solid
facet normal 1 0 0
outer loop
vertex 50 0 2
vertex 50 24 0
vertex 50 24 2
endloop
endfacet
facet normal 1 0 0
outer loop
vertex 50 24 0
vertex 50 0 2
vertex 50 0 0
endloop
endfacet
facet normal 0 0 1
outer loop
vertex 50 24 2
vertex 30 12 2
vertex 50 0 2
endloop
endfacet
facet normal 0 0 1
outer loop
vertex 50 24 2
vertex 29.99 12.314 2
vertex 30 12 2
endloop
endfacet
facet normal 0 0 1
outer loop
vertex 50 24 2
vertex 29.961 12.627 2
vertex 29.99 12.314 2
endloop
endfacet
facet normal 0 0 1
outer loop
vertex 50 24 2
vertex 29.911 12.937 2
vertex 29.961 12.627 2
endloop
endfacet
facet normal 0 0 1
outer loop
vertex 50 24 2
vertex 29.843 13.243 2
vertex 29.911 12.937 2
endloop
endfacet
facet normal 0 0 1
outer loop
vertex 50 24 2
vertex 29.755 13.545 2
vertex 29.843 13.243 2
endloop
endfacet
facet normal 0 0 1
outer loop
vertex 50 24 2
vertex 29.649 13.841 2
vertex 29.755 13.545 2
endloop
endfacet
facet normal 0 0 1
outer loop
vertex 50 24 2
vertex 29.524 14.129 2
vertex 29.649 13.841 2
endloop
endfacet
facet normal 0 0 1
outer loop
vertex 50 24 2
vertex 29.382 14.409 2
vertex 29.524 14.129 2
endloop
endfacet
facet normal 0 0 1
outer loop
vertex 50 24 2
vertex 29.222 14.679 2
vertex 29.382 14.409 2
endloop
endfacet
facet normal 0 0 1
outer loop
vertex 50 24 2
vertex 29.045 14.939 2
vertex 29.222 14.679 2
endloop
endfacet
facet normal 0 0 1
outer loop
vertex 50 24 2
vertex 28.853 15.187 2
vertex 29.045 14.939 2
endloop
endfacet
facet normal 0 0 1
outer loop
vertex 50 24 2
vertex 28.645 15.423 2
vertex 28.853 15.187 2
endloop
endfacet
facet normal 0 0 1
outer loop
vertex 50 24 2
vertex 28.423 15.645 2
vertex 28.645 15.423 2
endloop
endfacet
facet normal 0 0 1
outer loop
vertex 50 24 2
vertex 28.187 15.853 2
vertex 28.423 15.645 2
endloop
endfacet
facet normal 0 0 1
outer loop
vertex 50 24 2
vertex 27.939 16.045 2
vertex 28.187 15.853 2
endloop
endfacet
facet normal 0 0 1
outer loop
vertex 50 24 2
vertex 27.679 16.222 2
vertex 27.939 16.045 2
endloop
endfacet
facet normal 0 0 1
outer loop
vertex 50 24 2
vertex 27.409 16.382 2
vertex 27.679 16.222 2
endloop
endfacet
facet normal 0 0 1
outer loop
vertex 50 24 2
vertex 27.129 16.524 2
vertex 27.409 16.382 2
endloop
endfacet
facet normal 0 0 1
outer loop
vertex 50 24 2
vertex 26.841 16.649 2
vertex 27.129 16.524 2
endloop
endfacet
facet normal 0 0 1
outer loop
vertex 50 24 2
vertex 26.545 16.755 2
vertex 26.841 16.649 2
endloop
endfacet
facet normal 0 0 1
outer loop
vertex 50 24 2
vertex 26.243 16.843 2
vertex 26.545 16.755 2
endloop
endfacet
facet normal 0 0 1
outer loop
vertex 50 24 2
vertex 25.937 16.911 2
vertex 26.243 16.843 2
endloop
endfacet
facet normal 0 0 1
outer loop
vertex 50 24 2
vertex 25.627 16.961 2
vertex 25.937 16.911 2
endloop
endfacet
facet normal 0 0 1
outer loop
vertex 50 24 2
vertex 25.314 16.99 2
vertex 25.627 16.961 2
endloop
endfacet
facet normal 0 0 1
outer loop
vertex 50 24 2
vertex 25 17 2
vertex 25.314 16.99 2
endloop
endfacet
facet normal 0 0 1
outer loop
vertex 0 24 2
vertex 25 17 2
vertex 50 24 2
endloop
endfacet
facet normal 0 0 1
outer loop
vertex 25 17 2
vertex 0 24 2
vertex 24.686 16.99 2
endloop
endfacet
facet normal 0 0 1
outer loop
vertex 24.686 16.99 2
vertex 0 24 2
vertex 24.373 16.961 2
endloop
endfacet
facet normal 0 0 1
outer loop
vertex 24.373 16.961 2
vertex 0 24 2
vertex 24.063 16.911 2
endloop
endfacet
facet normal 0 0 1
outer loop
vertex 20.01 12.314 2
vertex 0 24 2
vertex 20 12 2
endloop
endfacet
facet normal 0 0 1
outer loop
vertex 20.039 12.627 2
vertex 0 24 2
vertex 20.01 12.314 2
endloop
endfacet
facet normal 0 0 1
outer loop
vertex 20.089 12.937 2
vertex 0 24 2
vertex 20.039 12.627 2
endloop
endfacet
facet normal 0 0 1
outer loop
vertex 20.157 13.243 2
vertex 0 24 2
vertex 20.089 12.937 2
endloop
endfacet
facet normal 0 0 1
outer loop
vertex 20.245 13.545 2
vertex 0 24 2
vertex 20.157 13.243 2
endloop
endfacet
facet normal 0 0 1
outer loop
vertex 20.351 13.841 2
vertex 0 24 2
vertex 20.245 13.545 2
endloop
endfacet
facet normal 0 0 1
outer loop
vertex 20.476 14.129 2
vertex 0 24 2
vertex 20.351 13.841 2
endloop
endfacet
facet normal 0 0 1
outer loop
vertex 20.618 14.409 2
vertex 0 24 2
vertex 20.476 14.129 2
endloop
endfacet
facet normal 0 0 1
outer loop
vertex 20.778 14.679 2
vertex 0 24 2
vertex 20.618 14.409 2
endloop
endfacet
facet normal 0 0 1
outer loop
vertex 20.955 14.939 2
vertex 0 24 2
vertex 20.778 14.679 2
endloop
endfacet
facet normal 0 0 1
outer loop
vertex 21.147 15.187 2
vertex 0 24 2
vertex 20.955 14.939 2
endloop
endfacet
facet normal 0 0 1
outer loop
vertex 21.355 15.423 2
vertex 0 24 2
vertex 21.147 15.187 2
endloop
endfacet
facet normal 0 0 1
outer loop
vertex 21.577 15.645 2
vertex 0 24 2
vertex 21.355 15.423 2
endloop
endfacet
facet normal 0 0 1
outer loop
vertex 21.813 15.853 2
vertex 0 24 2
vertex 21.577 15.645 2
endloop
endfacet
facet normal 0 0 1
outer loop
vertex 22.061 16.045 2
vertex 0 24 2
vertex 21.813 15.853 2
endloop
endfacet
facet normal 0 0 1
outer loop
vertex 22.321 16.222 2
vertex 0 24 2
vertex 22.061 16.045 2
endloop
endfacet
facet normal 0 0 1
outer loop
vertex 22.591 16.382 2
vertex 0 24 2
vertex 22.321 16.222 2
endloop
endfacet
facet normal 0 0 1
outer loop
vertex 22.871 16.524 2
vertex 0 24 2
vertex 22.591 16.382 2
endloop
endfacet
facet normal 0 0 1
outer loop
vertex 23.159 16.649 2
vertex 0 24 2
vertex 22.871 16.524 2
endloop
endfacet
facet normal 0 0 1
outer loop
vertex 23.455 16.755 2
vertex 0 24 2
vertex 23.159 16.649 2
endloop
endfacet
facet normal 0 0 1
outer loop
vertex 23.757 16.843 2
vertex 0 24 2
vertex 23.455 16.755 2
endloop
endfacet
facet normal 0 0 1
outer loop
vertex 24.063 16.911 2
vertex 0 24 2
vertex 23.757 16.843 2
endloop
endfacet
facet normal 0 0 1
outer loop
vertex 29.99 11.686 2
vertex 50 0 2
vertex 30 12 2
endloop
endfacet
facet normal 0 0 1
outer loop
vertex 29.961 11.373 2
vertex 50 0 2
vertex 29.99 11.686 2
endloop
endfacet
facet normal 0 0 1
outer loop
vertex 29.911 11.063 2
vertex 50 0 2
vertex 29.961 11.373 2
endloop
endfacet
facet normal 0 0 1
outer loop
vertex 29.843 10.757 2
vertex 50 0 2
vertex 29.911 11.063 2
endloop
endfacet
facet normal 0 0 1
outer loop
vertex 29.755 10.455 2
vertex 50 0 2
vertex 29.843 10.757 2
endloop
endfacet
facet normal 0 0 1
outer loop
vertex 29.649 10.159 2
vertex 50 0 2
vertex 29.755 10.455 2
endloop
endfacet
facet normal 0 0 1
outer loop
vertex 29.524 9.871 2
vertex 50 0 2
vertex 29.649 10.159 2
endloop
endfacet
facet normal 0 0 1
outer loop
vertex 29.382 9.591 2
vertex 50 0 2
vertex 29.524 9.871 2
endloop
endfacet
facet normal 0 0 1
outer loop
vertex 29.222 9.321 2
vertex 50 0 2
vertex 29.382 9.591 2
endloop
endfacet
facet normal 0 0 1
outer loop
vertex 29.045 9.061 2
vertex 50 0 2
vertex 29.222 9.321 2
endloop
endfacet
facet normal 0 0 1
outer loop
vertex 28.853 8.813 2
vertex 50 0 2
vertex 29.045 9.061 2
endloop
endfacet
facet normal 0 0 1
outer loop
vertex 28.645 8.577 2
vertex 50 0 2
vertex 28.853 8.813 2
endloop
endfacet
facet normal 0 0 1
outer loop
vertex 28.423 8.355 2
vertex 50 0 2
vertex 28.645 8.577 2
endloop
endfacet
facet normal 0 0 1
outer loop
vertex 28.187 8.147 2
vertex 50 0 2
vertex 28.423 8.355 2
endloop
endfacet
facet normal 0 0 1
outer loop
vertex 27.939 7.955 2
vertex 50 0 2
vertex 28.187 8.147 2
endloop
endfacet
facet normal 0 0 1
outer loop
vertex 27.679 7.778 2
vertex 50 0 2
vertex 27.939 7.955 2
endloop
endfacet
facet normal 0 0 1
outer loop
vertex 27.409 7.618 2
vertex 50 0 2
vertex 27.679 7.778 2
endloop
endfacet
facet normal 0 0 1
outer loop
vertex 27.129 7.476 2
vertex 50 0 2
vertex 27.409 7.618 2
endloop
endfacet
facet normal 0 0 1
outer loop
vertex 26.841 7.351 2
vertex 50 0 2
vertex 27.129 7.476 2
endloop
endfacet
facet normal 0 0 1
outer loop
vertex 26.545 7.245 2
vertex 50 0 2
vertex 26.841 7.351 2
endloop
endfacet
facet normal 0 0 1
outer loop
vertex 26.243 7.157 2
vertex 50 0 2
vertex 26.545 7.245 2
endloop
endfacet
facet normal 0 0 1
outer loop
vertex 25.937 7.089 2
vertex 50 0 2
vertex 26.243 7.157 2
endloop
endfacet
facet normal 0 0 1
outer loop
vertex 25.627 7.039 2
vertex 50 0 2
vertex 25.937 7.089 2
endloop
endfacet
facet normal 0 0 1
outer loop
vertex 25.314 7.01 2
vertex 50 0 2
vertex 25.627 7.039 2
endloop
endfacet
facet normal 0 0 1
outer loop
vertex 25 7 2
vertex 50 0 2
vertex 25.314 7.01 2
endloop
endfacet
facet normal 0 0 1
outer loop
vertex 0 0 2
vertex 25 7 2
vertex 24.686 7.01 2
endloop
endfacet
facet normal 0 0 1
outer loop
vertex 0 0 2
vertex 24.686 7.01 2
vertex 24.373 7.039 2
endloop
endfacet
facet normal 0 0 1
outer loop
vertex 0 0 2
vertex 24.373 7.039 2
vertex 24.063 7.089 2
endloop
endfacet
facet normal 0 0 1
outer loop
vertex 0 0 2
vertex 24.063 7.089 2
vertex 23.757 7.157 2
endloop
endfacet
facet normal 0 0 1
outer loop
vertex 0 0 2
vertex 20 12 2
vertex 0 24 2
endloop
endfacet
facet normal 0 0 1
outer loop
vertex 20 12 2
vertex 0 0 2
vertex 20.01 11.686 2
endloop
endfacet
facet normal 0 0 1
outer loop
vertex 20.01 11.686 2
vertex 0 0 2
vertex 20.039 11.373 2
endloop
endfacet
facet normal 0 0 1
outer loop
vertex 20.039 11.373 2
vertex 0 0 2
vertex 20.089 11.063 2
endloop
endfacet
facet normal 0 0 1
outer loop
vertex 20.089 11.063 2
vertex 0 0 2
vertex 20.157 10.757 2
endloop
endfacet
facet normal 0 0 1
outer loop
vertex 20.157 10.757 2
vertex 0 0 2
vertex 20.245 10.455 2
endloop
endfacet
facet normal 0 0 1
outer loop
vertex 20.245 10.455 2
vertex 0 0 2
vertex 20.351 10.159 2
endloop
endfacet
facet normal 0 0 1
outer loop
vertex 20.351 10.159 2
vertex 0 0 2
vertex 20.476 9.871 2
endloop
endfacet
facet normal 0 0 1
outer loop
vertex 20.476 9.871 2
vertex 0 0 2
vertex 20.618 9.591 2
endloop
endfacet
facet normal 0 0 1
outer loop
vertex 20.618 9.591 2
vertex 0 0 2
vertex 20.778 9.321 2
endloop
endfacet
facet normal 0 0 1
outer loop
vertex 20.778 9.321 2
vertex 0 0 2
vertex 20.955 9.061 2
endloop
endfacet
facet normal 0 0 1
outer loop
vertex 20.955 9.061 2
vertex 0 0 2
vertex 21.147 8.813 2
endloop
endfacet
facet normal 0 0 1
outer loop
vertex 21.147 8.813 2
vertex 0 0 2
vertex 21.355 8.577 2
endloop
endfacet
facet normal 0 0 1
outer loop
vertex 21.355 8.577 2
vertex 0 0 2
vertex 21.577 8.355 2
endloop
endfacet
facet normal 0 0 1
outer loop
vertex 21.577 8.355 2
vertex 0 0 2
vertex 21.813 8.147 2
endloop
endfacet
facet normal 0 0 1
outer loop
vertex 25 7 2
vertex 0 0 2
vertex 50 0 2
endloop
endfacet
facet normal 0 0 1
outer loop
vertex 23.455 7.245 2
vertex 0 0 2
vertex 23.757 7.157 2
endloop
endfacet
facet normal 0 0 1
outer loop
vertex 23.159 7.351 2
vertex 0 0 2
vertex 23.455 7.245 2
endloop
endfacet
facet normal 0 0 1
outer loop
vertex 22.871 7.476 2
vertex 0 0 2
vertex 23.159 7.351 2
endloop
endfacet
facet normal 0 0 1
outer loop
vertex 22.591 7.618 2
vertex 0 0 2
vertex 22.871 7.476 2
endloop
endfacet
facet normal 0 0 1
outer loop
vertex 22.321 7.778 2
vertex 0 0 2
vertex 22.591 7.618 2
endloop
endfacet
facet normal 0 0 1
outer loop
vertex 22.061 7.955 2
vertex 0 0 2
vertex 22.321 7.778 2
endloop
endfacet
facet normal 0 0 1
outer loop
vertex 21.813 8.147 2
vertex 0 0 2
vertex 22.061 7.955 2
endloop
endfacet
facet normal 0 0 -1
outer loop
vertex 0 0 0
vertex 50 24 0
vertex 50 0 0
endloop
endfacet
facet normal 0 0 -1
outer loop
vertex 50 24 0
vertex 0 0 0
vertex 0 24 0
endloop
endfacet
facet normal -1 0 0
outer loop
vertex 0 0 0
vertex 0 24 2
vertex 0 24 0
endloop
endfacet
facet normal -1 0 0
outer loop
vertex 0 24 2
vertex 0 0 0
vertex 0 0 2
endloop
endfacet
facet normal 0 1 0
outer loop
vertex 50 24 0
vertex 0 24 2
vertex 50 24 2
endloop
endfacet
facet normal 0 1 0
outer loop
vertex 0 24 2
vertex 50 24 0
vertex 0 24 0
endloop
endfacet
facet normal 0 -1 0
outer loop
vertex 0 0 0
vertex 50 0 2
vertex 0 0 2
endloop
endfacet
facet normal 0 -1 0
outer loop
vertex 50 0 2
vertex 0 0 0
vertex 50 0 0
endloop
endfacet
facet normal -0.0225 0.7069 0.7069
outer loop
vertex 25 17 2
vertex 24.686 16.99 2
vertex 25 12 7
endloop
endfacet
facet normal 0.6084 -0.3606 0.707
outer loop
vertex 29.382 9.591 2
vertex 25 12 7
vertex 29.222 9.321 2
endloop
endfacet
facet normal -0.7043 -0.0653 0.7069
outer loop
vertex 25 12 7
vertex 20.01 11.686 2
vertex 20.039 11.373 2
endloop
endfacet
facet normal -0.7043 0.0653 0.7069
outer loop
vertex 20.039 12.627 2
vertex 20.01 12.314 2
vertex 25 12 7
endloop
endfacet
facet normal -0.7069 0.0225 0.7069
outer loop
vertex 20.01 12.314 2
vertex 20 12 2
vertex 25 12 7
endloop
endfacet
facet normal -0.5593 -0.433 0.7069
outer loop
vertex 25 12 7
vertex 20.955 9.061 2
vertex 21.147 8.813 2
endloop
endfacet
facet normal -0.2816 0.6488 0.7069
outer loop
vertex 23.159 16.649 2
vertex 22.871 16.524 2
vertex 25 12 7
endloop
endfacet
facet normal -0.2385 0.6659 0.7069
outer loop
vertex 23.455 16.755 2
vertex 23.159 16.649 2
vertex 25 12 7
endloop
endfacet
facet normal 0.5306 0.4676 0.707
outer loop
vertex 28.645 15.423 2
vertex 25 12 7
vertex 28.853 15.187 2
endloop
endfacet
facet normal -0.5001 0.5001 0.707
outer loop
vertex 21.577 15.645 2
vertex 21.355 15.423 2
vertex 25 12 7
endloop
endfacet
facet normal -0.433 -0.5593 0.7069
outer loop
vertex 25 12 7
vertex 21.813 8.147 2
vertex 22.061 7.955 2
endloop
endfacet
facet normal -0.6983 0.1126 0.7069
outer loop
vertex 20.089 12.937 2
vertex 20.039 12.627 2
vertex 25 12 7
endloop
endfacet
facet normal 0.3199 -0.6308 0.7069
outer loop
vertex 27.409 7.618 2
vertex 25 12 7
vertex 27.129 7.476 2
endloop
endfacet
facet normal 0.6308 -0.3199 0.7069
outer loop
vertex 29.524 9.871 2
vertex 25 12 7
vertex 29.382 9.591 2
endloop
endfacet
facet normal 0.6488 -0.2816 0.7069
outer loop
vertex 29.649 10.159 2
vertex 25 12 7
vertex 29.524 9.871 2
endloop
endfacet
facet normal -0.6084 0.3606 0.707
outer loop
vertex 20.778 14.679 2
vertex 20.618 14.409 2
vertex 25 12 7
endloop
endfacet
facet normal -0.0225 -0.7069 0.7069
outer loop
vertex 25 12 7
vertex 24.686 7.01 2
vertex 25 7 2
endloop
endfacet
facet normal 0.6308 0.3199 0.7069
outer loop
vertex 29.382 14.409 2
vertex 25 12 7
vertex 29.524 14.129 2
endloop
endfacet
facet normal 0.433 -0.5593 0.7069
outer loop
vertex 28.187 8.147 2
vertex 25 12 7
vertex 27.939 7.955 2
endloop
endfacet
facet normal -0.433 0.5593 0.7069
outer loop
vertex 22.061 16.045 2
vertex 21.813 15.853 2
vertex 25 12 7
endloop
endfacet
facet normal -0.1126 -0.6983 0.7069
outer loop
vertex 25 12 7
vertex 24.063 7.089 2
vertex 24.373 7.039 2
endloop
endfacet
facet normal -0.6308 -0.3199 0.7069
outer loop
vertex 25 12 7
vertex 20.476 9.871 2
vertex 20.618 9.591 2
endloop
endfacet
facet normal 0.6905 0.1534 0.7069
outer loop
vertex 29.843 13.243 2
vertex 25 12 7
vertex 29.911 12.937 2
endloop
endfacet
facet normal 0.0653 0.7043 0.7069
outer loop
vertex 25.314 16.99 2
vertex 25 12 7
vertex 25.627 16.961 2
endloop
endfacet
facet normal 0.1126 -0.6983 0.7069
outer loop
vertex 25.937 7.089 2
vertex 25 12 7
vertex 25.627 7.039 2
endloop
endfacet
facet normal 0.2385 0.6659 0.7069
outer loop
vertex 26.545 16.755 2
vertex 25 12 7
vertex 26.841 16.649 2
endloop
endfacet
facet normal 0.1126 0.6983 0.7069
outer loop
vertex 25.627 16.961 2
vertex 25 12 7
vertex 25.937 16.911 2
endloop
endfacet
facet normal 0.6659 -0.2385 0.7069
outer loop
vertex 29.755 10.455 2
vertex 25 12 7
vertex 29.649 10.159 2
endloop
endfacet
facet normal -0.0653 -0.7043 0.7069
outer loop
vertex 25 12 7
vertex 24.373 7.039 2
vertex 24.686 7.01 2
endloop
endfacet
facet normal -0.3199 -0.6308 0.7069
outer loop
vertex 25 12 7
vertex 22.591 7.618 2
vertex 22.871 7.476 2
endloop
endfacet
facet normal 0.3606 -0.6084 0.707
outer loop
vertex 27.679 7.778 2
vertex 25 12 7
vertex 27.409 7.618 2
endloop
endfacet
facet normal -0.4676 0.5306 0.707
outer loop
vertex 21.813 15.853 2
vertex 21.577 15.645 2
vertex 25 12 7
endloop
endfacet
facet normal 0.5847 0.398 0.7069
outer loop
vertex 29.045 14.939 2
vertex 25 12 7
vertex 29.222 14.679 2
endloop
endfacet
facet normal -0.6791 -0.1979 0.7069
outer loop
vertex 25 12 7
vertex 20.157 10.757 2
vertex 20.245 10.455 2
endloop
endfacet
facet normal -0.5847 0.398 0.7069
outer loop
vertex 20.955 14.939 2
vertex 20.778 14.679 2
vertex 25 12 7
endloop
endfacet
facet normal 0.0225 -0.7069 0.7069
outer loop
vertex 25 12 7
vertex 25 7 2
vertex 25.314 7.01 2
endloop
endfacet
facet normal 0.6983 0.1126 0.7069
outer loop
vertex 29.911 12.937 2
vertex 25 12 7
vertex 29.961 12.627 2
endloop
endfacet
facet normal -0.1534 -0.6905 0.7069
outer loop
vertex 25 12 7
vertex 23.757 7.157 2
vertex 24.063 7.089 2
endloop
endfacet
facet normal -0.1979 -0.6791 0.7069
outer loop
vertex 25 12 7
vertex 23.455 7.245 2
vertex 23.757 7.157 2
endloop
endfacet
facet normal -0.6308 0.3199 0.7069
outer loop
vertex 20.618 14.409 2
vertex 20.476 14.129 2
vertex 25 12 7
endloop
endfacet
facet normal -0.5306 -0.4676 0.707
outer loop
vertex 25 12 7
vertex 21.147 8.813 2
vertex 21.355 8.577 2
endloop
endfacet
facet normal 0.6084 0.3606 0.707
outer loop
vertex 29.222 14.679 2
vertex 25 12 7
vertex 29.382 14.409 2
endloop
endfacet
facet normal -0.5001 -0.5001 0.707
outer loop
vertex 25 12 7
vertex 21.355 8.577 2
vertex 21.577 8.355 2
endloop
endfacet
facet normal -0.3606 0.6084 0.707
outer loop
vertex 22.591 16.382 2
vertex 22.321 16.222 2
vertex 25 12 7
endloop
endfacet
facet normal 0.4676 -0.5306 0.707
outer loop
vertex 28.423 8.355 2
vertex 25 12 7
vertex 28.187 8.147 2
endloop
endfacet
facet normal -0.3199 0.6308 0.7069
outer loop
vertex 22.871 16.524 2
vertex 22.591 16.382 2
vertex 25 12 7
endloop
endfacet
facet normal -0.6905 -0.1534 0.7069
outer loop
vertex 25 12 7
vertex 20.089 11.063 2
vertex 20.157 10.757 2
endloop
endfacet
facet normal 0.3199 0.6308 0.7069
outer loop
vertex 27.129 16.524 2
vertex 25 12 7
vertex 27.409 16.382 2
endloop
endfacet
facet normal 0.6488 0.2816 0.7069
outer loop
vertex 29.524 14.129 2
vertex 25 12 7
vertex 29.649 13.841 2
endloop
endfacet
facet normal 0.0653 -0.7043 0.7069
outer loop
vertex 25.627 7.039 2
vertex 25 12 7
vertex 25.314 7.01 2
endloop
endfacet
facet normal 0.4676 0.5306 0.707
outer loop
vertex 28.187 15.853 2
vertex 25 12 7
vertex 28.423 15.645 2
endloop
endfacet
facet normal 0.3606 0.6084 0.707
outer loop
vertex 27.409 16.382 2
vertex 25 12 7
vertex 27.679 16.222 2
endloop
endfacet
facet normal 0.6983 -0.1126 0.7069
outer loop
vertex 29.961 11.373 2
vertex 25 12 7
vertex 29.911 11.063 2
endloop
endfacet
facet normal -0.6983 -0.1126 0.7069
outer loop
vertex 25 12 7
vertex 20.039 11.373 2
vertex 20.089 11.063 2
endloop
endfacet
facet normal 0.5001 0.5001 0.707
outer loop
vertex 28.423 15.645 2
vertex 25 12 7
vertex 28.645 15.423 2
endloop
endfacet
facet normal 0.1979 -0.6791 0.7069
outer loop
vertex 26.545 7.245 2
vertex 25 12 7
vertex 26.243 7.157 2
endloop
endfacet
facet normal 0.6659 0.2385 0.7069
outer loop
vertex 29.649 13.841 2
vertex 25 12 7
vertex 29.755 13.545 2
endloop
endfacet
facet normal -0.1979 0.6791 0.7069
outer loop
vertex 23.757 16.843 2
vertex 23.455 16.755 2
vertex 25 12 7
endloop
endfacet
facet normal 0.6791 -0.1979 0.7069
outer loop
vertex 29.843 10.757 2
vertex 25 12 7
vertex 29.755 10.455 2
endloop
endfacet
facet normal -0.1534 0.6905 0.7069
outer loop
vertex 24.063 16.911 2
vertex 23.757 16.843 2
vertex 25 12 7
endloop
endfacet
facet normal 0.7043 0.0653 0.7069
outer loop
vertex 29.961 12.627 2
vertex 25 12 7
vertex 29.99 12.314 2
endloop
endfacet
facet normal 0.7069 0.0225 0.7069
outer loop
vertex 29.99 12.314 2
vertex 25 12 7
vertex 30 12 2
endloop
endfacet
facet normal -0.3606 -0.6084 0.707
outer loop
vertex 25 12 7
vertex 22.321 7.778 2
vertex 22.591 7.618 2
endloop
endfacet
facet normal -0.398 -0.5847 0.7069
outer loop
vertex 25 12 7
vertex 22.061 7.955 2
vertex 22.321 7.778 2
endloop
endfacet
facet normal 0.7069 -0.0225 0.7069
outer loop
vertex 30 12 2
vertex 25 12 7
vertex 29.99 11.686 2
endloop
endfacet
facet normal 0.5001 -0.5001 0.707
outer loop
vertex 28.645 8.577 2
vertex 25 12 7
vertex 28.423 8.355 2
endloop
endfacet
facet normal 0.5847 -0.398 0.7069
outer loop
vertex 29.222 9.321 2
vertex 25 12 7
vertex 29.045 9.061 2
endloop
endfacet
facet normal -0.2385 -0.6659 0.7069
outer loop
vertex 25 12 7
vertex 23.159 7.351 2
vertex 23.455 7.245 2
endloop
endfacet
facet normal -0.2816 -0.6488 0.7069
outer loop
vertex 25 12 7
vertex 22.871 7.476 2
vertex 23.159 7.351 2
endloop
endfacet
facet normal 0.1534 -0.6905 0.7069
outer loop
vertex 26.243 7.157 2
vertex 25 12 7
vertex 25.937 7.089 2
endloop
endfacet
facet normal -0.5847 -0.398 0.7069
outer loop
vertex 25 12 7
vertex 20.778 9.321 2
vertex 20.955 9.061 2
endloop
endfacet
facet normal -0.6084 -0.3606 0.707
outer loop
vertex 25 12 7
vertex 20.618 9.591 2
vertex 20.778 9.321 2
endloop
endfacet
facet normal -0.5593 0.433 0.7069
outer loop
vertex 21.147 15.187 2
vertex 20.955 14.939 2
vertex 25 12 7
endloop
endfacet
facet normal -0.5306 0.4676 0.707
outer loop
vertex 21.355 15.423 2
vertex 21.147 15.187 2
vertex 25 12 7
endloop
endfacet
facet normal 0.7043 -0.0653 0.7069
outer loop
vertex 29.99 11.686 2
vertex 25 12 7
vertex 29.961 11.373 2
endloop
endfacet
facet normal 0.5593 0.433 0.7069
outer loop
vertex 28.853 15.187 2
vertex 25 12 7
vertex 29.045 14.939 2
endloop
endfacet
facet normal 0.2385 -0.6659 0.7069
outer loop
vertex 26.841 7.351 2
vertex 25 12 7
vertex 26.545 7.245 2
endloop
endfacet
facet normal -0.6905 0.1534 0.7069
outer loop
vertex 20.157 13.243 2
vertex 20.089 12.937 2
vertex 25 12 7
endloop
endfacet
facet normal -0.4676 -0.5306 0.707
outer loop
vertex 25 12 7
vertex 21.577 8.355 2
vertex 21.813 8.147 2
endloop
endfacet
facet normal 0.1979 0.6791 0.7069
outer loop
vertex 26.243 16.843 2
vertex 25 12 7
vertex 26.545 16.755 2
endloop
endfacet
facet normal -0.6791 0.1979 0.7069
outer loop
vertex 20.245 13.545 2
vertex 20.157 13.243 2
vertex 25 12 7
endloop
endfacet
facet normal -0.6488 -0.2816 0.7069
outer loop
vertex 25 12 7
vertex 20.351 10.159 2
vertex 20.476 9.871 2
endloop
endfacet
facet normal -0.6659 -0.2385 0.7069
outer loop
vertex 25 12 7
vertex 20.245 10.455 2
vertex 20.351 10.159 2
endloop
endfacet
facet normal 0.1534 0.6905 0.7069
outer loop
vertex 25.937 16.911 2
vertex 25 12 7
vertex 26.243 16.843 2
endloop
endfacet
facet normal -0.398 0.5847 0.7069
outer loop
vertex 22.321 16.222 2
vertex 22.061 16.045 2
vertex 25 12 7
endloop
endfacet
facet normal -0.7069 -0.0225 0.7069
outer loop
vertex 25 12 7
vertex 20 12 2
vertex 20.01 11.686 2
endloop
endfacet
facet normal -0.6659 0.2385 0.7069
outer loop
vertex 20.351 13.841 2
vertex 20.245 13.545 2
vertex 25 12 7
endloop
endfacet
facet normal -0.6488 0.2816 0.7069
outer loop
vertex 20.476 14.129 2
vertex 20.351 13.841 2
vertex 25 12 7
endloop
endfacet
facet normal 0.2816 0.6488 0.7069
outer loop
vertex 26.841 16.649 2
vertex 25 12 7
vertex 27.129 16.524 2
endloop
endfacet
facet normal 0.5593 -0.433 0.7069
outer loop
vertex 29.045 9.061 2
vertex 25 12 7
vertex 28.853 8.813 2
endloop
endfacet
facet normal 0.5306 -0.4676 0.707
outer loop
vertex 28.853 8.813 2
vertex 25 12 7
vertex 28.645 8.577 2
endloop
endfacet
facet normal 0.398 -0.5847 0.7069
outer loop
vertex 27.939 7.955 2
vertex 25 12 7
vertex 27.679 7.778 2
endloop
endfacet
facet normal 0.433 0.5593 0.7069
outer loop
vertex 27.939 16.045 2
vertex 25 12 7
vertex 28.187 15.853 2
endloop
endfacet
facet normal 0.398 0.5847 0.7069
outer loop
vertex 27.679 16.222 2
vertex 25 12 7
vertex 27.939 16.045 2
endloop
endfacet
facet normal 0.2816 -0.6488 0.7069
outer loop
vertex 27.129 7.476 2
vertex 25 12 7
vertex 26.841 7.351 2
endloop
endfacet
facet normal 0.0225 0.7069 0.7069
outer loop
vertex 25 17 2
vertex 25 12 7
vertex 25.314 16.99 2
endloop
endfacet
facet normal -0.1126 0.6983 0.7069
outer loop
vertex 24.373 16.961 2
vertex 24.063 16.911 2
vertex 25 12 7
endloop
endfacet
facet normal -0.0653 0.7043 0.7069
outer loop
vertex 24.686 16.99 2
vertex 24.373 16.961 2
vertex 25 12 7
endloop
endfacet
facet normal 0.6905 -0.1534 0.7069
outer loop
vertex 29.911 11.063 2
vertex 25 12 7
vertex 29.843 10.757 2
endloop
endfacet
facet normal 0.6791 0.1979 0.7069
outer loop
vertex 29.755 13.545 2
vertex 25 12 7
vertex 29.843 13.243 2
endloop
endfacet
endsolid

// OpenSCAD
difference(){
	union(){ 

        translate([0,0,0]){
           cube([50,24,2], center=false);
        }                
        translate([25,12,2]){
            rotate([0,0,90]){
                cylinder(h=5, r1=5, r2=0, $fn=100, center=false);
            }   
        }
	}
	union() {

	}
}
